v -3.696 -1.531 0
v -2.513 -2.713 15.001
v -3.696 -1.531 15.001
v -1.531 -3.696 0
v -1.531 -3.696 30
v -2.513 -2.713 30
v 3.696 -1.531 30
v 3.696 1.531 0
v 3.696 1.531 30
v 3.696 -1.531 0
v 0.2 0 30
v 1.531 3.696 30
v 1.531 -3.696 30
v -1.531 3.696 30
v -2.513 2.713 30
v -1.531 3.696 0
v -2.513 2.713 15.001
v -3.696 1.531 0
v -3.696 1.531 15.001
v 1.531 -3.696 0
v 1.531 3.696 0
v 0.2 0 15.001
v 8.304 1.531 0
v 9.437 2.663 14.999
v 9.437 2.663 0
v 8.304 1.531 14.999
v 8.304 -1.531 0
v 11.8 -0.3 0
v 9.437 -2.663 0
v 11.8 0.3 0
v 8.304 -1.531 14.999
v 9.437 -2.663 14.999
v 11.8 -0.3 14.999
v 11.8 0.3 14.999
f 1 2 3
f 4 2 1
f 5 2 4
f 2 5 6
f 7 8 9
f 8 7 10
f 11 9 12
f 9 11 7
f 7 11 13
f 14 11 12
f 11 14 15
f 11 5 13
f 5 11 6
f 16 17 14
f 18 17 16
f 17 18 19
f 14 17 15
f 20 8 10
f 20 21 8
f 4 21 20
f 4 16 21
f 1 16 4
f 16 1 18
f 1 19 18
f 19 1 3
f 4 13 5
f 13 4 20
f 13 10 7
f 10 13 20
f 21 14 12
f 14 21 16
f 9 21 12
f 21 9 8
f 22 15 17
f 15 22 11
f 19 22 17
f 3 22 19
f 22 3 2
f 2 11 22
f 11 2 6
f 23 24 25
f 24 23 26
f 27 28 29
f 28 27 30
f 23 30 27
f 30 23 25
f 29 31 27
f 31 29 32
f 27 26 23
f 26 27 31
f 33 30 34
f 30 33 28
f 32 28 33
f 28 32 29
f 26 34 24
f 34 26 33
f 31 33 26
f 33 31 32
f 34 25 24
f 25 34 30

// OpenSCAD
diameter=8;
length=30;
drillBitInHandle=15;
drillBitDiameter=0.4;

module dummy() {}

nudge = 0.001;

module handle() {
    linear_extrude(height=length)
    rotate([0,0,22.5]) circle($fn=8,d=diameter);
}

module wedge() {
    linear_extrude(height=drillBitInHandle)
    circle($fn=4,d=diameter);
}

render(convexity=2)
translate([0,0,length])
rotate([180,0,0])
difference() {
    handle();
    translate([-diameter/2+drillBitDiameter/2,0,-nudge]) wedge();
}

render(convexity=2)
translate([1.5*diameter,0,0])
intersection() {
    handle();
    translate([-drillBitDiameter/2-diameter,-diameter/2,0]) cube([diameter,diameter,drillBitInHandle]);
    translate([-diameter/2+drillBitDiameter/4,0,-nudge]) wedge();
}
